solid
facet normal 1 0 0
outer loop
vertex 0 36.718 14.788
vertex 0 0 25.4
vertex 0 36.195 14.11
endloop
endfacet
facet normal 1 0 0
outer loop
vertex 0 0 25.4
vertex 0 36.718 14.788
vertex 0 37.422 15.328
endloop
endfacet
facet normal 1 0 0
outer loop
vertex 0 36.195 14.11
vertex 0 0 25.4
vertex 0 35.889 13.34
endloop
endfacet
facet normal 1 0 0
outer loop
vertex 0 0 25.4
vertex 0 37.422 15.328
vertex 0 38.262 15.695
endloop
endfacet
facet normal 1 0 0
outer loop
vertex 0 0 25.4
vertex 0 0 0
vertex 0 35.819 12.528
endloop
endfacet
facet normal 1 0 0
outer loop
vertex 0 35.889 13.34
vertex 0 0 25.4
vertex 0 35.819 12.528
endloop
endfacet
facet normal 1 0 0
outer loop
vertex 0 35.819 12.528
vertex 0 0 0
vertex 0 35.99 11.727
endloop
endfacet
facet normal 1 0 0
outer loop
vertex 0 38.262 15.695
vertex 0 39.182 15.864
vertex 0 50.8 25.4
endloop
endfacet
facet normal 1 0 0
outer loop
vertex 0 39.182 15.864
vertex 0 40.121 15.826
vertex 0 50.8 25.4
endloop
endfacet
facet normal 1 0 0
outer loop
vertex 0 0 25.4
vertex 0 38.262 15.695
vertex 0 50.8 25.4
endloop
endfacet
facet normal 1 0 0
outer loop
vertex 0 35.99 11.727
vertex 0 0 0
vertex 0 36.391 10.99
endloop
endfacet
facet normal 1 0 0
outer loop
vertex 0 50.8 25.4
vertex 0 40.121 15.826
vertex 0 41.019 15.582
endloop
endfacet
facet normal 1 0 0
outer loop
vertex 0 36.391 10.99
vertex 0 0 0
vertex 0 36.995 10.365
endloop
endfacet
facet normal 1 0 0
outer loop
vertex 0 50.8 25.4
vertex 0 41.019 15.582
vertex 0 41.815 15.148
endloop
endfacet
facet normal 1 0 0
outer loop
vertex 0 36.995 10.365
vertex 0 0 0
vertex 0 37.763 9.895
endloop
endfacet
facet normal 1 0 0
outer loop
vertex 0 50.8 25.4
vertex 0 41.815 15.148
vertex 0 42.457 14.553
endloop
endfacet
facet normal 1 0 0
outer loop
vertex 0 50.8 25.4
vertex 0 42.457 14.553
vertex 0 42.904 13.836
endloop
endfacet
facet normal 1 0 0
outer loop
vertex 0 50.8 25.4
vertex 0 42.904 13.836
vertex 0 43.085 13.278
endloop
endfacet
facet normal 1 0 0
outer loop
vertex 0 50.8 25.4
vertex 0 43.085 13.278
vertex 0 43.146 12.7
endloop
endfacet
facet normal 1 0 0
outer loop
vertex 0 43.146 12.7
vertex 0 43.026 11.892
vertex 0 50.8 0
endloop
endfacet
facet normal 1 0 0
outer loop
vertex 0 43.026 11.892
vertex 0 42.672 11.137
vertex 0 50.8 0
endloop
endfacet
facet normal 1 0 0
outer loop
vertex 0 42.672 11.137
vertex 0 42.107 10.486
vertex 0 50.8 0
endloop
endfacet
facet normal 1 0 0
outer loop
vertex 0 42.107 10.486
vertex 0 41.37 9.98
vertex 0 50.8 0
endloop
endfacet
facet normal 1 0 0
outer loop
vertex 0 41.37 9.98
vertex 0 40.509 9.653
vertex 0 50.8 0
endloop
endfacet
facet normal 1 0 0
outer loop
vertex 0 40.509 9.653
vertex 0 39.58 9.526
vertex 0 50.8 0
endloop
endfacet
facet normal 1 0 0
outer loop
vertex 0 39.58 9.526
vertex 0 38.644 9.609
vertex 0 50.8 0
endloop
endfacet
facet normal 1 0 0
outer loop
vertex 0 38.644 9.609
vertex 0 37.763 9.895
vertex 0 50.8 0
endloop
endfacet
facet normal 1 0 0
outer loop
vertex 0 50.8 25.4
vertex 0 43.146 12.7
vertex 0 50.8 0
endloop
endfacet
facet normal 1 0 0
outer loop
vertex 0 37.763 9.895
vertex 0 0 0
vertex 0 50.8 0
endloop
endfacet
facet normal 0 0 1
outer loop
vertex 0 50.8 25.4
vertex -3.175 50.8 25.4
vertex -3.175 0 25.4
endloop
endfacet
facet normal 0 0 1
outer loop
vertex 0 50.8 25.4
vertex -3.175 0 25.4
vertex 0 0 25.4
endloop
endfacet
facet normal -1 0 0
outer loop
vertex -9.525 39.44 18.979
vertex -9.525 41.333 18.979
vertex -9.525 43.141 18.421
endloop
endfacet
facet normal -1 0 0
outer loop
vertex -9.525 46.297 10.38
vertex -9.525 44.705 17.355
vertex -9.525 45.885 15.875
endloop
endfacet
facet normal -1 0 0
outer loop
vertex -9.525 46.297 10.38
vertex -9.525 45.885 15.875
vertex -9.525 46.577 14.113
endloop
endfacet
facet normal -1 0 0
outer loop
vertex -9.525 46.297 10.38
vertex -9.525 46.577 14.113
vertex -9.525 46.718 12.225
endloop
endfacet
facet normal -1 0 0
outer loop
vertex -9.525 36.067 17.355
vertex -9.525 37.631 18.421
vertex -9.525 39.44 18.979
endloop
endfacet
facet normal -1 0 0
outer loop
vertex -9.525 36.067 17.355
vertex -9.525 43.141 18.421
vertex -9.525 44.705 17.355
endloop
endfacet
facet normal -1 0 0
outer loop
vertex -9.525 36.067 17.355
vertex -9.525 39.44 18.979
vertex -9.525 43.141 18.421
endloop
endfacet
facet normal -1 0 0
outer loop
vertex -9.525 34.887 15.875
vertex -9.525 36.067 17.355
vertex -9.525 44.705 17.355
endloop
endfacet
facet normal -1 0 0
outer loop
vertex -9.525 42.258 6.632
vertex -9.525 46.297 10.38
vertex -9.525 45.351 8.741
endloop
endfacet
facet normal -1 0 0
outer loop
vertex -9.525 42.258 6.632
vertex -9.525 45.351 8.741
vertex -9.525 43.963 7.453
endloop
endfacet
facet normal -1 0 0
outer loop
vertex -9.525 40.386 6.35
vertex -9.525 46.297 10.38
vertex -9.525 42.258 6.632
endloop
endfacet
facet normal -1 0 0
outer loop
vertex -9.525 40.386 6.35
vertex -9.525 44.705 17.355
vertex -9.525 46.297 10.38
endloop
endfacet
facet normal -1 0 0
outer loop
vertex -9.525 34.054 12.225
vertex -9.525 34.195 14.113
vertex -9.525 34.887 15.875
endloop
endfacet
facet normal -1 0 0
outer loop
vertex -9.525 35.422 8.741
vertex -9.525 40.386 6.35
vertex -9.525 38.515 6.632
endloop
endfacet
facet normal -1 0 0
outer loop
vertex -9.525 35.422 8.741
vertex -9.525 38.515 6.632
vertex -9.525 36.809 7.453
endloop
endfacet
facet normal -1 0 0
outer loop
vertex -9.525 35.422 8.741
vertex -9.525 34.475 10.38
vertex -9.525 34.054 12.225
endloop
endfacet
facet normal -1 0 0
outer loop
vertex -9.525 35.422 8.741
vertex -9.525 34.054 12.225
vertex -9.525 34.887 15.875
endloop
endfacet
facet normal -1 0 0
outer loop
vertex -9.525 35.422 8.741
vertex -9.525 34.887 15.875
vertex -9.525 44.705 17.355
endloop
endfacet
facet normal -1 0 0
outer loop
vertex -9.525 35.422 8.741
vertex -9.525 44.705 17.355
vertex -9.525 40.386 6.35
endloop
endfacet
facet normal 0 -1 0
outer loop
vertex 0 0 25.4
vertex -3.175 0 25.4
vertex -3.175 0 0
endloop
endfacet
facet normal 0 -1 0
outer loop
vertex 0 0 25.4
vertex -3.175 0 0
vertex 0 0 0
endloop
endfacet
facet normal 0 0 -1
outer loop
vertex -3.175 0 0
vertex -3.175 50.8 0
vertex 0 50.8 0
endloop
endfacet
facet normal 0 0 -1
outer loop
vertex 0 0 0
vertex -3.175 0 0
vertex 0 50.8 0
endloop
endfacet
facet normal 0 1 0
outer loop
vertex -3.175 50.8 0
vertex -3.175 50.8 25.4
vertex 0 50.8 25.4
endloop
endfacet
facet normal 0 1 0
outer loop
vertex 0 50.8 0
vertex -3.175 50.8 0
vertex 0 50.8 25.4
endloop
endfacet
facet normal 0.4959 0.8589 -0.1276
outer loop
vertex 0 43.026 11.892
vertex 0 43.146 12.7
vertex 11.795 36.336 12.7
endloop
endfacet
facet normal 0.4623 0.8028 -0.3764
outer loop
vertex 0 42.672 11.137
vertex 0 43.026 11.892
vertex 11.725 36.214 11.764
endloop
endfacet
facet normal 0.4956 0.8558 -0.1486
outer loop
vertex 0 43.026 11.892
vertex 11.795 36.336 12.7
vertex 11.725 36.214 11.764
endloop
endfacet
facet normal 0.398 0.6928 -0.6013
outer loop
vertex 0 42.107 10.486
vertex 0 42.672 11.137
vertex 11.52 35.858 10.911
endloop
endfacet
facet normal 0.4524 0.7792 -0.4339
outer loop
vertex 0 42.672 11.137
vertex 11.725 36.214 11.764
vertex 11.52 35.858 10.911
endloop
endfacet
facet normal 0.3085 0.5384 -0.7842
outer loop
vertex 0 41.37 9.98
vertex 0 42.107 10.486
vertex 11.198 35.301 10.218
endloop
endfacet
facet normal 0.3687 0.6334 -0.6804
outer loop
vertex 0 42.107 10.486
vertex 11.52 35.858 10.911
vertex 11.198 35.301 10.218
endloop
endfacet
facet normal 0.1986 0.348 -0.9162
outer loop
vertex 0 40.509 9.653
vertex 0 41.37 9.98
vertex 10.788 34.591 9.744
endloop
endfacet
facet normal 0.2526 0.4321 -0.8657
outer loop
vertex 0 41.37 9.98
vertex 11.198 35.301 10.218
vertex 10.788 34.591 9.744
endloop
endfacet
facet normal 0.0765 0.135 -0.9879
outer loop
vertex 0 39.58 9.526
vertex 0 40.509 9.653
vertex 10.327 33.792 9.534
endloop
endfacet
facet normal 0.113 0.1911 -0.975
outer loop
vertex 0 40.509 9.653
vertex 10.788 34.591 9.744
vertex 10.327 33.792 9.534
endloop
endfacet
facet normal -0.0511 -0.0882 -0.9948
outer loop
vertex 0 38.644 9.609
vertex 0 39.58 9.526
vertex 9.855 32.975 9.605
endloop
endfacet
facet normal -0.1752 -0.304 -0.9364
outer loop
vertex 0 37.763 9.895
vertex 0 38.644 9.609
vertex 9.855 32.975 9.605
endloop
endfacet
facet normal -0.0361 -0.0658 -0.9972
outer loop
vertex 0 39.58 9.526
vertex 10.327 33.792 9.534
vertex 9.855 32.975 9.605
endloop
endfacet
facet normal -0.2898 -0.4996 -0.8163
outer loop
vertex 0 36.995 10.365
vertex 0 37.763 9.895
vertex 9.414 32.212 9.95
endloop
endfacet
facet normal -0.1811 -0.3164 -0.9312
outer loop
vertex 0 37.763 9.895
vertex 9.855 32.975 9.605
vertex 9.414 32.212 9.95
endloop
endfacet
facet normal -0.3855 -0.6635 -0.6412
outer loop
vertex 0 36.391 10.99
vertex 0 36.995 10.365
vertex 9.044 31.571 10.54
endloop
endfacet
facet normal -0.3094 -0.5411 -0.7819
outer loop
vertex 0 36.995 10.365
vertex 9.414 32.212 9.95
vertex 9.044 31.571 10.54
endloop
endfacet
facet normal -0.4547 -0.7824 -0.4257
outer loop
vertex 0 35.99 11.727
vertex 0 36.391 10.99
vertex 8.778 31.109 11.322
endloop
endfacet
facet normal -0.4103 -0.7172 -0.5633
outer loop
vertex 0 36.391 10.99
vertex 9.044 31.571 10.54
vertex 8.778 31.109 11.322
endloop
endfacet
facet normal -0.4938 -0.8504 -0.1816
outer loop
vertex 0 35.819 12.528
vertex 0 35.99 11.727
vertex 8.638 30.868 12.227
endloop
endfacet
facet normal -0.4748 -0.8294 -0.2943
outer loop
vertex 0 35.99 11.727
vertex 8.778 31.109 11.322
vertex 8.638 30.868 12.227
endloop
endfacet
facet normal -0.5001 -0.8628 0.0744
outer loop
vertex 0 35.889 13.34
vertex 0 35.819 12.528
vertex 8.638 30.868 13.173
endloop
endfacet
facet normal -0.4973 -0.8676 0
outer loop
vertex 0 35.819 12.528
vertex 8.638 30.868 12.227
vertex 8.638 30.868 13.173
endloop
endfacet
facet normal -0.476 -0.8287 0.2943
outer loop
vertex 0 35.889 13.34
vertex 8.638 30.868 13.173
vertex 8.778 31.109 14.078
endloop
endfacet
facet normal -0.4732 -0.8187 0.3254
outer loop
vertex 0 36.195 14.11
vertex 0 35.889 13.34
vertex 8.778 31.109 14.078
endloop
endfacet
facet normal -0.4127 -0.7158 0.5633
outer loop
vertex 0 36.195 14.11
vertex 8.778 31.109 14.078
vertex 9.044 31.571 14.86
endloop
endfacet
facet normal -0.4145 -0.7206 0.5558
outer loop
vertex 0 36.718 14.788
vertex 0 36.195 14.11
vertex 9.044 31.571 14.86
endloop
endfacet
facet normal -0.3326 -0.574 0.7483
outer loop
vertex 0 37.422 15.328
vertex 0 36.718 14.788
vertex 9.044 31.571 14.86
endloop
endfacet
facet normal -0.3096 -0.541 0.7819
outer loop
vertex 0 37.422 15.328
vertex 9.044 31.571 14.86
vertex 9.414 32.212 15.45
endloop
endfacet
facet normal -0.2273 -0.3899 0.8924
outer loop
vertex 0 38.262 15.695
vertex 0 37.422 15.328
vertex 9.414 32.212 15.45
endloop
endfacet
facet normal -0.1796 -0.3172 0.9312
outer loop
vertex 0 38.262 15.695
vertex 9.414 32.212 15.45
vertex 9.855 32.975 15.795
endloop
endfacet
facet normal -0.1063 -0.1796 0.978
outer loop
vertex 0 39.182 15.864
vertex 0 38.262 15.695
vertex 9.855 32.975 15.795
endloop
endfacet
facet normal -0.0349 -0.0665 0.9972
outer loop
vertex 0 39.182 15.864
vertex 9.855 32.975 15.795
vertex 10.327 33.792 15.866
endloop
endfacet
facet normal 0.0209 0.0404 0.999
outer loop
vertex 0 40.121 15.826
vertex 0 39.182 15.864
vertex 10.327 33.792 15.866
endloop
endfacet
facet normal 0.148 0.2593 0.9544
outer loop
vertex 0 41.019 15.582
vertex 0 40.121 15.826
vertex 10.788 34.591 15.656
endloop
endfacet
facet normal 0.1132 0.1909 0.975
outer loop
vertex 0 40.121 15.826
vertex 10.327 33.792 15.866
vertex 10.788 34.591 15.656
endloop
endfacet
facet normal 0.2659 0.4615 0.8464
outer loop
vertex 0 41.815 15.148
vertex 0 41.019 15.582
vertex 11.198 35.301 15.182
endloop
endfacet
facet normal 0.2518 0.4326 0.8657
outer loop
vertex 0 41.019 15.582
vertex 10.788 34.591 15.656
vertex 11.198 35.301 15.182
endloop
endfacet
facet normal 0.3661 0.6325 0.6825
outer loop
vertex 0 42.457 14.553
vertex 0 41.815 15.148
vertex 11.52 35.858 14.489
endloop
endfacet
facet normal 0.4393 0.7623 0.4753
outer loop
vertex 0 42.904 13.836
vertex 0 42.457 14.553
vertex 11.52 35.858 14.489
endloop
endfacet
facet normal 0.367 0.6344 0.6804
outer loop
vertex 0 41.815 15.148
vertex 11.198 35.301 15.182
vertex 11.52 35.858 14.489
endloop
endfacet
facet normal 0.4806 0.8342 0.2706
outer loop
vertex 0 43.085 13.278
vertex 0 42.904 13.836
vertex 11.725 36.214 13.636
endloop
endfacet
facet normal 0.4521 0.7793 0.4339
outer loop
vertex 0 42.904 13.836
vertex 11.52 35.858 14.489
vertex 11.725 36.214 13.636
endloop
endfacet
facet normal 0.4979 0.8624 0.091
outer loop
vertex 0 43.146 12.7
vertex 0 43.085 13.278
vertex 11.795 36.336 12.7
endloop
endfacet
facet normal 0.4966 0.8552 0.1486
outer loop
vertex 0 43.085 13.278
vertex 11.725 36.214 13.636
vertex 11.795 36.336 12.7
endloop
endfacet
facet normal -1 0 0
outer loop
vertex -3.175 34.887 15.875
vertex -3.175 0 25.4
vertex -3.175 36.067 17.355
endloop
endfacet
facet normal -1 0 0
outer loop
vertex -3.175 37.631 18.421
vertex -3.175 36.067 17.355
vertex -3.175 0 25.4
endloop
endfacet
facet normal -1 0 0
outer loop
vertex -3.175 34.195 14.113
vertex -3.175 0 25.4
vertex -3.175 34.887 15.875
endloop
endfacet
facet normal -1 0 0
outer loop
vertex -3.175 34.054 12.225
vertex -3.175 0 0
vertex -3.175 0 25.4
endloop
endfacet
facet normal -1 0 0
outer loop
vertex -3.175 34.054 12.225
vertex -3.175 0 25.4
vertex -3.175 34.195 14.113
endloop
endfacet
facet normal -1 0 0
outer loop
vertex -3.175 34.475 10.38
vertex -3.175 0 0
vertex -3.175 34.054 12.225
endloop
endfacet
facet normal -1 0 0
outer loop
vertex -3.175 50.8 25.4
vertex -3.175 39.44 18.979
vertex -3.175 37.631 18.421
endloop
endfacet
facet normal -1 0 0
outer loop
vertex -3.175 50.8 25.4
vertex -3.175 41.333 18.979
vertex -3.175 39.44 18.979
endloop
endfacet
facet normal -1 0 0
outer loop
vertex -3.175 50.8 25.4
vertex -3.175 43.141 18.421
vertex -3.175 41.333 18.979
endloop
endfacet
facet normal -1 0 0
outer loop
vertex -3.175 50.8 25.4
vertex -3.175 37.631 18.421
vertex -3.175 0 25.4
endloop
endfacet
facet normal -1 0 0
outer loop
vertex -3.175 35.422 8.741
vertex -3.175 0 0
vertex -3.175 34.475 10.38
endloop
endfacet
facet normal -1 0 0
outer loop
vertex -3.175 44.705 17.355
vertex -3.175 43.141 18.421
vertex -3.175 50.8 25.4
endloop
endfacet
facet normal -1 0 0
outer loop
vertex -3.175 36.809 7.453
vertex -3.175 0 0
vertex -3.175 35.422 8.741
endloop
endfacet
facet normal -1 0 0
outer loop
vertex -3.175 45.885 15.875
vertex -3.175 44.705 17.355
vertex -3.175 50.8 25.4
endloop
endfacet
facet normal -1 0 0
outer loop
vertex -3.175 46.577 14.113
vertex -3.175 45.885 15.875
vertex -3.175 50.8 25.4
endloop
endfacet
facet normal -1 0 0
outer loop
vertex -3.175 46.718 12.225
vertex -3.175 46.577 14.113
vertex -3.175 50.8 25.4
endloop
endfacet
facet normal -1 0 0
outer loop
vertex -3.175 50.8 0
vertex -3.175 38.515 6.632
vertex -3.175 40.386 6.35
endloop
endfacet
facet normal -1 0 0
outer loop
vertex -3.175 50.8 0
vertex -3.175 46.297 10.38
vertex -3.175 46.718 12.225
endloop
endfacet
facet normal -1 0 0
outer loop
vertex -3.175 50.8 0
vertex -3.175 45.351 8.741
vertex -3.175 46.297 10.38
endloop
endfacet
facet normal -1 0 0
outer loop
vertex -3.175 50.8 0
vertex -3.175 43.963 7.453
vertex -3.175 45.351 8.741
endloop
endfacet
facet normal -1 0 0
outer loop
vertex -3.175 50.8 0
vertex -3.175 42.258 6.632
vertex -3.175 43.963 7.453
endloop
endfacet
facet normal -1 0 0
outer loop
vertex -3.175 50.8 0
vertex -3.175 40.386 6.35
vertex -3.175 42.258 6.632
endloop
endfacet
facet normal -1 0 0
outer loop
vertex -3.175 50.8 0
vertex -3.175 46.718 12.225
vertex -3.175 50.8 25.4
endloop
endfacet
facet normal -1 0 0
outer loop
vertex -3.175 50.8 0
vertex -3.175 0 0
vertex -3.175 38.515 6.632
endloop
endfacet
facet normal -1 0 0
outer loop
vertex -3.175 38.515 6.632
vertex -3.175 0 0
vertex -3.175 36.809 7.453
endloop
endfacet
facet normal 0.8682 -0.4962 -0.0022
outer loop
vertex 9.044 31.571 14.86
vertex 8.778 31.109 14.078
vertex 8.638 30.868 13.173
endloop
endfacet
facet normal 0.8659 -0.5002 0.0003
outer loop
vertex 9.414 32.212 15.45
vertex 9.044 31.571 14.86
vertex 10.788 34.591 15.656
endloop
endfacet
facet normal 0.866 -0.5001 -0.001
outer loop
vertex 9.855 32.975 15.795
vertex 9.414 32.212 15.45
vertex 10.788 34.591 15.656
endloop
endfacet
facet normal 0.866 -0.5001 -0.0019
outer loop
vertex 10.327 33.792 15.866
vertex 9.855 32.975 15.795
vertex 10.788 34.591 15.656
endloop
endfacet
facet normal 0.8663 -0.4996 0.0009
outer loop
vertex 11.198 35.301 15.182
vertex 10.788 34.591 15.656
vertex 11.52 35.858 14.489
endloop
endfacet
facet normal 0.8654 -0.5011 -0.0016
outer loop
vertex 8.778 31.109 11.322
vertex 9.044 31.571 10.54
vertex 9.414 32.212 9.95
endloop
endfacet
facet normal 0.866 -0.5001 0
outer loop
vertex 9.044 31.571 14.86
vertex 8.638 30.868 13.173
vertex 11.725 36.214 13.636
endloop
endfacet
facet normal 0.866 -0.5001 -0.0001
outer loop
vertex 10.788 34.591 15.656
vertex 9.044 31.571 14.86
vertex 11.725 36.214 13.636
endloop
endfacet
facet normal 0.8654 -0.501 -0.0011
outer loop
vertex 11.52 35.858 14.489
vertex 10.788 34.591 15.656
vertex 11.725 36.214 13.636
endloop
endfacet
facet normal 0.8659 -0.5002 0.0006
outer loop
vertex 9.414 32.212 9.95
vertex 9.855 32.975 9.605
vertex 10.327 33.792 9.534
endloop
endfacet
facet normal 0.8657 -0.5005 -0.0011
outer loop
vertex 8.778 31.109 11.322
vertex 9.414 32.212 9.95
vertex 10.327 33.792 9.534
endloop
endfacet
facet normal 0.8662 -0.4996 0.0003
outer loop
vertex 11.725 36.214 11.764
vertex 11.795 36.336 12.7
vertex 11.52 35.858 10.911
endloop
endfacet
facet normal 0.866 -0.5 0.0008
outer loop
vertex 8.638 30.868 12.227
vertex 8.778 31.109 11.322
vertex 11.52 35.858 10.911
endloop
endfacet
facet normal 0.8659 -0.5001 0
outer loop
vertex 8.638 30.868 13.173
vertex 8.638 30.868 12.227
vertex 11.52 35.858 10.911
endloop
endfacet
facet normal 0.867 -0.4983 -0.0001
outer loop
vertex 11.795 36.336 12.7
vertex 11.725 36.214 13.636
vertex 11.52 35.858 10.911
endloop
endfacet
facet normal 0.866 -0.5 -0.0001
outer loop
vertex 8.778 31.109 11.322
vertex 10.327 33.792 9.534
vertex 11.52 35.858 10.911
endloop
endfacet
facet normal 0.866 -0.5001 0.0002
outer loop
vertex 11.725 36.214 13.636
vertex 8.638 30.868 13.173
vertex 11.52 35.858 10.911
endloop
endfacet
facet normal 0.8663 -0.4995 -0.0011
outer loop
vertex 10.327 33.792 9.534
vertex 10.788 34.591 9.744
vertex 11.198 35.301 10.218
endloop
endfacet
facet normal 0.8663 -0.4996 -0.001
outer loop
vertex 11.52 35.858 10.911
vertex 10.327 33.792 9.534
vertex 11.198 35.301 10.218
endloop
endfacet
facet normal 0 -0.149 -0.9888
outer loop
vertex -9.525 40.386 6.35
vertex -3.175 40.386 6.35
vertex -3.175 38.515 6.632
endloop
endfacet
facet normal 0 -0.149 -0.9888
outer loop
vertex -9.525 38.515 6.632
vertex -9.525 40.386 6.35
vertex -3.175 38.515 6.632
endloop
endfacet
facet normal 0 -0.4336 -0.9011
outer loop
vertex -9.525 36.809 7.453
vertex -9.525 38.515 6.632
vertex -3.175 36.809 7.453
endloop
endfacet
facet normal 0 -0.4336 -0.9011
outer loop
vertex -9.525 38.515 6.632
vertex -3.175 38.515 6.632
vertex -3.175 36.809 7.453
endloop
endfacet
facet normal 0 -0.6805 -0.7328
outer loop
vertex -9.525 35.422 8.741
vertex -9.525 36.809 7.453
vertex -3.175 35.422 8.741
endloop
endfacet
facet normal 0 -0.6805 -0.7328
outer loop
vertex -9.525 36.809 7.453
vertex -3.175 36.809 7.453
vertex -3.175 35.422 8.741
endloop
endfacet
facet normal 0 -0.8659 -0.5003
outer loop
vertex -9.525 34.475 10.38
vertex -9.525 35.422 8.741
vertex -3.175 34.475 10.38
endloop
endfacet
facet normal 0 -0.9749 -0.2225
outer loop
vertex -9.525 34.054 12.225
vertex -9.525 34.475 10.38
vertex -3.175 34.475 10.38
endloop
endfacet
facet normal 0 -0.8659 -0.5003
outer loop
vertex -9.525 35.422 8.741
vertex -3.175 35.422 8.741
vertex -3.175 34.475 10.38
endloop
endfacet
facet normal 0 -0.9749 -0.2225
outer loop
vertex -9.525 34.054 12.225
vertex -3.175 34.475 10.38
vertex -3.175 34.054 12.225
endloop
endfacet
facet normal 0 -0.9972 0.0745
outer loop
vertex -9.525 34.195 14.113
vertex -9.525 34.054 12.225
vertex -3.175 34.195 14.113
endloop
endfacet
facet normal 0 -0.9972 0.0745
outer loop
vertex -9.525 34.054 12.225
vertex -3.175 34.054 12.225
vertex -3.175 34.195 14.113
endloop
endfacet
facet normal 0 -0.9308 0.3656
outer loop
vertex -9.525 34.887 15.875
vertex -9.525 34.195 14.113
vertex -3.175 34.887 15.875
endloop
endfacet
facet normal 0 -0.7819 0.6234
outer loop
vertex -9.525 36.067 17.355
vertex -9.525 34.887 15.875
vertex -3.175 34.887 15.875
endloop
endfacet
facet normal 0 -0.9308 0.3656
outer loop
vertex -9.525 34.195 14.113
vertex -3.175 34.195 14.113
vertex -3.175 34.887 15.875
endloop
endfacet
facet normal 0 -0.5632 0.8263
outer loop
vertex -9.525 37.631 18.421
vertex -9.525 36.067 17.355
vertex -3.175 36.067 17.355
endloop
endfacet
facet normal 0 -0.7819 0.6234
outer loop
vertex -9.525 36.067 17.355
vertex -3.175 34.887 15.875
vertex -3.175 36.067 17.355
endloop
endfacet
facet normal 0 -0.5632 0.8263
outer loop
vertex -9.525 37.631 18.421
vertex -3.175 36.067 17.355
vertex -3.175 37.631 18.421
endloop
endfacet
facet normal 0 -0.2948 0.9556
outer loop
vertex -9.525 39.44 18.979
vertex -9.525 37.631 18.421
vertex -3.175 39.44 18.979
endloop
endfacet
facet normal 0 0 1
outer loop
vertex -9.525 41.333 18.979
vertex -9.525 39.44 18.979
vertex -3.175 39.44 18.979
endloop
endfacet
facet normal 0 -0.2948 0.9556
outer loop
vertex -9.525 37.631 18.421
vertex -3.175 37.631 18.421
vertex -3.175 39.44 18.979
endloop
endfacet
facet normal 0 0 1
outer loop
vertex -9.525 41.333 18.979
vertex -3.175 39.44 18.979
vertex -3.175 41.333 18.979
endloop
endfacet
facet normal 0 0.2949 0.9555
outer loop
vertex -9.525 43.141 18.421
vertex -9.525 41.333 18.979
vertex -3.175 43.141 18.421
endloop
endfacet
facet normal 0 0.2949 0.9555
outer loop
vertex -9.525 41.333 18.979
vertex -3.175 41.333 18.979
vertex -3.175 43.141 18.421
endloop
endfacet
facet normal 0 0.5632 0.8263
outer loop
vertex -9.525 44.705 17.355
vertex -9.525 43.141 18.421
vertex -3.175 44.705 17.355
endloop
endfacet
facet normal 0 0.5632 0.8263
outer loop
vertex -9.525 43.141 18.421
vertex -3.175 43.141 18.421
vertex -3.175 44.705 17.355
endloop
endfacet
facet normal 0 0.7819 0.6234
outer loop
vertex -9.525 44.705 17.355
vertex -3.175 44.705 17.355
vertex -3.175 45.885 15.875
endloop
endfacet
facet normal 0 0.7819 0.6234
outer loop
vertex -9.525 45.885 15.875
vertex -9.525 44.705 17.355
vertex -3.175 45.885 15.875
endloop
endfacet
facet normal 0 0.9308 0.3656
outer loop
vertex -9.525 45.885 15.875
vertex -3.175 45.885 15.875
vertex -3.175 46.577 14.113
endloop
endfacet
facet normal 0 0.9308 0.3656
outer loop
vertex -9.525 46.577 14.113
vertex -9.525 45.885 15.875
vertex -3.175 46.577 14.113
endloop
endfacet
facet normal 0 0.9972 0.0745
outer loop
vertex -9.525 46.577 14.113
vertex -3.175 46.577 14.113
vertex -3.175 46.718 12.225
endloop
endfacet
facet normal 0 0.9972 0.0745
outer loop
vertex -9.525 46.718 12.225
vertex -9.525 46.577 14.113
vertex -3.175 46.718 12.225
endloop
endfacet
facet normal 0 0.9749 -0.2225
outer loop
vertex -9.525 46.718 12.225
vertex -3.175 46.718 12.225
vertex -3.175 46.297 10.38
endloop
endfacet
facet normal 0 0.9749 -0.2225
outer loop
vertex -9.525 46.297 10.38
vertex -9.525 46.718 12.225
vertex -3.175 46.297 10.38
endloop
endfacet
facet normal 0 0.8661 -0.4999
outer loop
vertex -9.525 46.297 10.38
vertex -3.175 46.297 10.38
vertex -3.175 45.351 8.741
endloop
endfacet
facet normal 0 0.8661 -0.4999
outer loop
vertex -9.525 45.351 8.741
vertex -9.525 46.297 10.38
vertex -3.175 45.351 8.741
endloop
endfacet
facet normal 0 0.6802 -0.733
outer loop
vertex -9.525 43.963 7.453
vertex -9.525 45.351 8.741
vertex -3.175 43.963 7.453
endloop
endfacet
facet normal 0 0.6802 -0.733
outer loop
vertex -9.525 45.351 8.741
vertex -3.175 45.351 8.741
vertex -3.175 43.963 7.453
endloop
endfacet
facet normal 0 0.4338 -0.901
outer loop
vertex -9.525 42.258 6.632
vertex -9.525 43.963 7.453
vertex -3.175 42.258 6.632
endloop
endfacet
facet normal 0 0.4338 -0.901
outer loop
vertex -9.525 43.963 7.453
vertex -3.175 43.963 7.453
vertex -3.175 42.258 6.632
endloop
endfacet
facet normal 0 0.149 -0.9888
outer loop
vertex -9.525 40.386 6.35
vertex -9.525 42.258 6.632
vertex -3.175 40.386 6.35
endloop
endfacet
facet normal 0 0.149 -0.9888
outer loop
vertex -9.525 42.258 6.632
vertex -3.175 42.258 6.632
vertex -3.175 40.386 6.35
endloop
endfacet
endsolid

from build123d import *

# Parameters (mm, degrees)
SKETCH1_W           = 3.175
SKETCH1_H           = 50.8
BOSS_EXTRUDE1_DEPTH = 25.4
SKETCH2_R           = 6.35
BOSS_EXTRUDE2_DEPTH = 6.35


with BuildPart() as part:
    # Sketch1 → Boss-Extrude1 (new body)
    with BuildSketch(Plane.XY):
        with Locations((-1.5875, 25.4)):
            Rectangle(SKETCH1_W, SKETCH1_H)
    extrude(amount=BOSS_EXTRUDE1_DEPTH)

    # Sketch2 → Boss-Extrude2 (add)
    with BuildSketch(Plane.ZY.offset(3.175)):
        with Locations(Location((12.7, 40.386207141, 0), (0, 0, 180))):
            Circle(SKETCH2_R)
    extrude(amount=BOSS_EXTRUDE2_DEPTH)

    # Sketch5 → Revolve2 (revolve)
    with BuildSketch(Plane.XY.offset(12.7)):
        Polygon((0, 43.146240345), (11.795403193, 36.336161137), (10.207903193, 33.586530479), (0, 39.480066136), align=None)
    revolve(axis=Axis((10.207903193, 33.586530479, 12.7), (-0.8660254037844417, 0.4999999999999948, 0)))


solid = part.part
